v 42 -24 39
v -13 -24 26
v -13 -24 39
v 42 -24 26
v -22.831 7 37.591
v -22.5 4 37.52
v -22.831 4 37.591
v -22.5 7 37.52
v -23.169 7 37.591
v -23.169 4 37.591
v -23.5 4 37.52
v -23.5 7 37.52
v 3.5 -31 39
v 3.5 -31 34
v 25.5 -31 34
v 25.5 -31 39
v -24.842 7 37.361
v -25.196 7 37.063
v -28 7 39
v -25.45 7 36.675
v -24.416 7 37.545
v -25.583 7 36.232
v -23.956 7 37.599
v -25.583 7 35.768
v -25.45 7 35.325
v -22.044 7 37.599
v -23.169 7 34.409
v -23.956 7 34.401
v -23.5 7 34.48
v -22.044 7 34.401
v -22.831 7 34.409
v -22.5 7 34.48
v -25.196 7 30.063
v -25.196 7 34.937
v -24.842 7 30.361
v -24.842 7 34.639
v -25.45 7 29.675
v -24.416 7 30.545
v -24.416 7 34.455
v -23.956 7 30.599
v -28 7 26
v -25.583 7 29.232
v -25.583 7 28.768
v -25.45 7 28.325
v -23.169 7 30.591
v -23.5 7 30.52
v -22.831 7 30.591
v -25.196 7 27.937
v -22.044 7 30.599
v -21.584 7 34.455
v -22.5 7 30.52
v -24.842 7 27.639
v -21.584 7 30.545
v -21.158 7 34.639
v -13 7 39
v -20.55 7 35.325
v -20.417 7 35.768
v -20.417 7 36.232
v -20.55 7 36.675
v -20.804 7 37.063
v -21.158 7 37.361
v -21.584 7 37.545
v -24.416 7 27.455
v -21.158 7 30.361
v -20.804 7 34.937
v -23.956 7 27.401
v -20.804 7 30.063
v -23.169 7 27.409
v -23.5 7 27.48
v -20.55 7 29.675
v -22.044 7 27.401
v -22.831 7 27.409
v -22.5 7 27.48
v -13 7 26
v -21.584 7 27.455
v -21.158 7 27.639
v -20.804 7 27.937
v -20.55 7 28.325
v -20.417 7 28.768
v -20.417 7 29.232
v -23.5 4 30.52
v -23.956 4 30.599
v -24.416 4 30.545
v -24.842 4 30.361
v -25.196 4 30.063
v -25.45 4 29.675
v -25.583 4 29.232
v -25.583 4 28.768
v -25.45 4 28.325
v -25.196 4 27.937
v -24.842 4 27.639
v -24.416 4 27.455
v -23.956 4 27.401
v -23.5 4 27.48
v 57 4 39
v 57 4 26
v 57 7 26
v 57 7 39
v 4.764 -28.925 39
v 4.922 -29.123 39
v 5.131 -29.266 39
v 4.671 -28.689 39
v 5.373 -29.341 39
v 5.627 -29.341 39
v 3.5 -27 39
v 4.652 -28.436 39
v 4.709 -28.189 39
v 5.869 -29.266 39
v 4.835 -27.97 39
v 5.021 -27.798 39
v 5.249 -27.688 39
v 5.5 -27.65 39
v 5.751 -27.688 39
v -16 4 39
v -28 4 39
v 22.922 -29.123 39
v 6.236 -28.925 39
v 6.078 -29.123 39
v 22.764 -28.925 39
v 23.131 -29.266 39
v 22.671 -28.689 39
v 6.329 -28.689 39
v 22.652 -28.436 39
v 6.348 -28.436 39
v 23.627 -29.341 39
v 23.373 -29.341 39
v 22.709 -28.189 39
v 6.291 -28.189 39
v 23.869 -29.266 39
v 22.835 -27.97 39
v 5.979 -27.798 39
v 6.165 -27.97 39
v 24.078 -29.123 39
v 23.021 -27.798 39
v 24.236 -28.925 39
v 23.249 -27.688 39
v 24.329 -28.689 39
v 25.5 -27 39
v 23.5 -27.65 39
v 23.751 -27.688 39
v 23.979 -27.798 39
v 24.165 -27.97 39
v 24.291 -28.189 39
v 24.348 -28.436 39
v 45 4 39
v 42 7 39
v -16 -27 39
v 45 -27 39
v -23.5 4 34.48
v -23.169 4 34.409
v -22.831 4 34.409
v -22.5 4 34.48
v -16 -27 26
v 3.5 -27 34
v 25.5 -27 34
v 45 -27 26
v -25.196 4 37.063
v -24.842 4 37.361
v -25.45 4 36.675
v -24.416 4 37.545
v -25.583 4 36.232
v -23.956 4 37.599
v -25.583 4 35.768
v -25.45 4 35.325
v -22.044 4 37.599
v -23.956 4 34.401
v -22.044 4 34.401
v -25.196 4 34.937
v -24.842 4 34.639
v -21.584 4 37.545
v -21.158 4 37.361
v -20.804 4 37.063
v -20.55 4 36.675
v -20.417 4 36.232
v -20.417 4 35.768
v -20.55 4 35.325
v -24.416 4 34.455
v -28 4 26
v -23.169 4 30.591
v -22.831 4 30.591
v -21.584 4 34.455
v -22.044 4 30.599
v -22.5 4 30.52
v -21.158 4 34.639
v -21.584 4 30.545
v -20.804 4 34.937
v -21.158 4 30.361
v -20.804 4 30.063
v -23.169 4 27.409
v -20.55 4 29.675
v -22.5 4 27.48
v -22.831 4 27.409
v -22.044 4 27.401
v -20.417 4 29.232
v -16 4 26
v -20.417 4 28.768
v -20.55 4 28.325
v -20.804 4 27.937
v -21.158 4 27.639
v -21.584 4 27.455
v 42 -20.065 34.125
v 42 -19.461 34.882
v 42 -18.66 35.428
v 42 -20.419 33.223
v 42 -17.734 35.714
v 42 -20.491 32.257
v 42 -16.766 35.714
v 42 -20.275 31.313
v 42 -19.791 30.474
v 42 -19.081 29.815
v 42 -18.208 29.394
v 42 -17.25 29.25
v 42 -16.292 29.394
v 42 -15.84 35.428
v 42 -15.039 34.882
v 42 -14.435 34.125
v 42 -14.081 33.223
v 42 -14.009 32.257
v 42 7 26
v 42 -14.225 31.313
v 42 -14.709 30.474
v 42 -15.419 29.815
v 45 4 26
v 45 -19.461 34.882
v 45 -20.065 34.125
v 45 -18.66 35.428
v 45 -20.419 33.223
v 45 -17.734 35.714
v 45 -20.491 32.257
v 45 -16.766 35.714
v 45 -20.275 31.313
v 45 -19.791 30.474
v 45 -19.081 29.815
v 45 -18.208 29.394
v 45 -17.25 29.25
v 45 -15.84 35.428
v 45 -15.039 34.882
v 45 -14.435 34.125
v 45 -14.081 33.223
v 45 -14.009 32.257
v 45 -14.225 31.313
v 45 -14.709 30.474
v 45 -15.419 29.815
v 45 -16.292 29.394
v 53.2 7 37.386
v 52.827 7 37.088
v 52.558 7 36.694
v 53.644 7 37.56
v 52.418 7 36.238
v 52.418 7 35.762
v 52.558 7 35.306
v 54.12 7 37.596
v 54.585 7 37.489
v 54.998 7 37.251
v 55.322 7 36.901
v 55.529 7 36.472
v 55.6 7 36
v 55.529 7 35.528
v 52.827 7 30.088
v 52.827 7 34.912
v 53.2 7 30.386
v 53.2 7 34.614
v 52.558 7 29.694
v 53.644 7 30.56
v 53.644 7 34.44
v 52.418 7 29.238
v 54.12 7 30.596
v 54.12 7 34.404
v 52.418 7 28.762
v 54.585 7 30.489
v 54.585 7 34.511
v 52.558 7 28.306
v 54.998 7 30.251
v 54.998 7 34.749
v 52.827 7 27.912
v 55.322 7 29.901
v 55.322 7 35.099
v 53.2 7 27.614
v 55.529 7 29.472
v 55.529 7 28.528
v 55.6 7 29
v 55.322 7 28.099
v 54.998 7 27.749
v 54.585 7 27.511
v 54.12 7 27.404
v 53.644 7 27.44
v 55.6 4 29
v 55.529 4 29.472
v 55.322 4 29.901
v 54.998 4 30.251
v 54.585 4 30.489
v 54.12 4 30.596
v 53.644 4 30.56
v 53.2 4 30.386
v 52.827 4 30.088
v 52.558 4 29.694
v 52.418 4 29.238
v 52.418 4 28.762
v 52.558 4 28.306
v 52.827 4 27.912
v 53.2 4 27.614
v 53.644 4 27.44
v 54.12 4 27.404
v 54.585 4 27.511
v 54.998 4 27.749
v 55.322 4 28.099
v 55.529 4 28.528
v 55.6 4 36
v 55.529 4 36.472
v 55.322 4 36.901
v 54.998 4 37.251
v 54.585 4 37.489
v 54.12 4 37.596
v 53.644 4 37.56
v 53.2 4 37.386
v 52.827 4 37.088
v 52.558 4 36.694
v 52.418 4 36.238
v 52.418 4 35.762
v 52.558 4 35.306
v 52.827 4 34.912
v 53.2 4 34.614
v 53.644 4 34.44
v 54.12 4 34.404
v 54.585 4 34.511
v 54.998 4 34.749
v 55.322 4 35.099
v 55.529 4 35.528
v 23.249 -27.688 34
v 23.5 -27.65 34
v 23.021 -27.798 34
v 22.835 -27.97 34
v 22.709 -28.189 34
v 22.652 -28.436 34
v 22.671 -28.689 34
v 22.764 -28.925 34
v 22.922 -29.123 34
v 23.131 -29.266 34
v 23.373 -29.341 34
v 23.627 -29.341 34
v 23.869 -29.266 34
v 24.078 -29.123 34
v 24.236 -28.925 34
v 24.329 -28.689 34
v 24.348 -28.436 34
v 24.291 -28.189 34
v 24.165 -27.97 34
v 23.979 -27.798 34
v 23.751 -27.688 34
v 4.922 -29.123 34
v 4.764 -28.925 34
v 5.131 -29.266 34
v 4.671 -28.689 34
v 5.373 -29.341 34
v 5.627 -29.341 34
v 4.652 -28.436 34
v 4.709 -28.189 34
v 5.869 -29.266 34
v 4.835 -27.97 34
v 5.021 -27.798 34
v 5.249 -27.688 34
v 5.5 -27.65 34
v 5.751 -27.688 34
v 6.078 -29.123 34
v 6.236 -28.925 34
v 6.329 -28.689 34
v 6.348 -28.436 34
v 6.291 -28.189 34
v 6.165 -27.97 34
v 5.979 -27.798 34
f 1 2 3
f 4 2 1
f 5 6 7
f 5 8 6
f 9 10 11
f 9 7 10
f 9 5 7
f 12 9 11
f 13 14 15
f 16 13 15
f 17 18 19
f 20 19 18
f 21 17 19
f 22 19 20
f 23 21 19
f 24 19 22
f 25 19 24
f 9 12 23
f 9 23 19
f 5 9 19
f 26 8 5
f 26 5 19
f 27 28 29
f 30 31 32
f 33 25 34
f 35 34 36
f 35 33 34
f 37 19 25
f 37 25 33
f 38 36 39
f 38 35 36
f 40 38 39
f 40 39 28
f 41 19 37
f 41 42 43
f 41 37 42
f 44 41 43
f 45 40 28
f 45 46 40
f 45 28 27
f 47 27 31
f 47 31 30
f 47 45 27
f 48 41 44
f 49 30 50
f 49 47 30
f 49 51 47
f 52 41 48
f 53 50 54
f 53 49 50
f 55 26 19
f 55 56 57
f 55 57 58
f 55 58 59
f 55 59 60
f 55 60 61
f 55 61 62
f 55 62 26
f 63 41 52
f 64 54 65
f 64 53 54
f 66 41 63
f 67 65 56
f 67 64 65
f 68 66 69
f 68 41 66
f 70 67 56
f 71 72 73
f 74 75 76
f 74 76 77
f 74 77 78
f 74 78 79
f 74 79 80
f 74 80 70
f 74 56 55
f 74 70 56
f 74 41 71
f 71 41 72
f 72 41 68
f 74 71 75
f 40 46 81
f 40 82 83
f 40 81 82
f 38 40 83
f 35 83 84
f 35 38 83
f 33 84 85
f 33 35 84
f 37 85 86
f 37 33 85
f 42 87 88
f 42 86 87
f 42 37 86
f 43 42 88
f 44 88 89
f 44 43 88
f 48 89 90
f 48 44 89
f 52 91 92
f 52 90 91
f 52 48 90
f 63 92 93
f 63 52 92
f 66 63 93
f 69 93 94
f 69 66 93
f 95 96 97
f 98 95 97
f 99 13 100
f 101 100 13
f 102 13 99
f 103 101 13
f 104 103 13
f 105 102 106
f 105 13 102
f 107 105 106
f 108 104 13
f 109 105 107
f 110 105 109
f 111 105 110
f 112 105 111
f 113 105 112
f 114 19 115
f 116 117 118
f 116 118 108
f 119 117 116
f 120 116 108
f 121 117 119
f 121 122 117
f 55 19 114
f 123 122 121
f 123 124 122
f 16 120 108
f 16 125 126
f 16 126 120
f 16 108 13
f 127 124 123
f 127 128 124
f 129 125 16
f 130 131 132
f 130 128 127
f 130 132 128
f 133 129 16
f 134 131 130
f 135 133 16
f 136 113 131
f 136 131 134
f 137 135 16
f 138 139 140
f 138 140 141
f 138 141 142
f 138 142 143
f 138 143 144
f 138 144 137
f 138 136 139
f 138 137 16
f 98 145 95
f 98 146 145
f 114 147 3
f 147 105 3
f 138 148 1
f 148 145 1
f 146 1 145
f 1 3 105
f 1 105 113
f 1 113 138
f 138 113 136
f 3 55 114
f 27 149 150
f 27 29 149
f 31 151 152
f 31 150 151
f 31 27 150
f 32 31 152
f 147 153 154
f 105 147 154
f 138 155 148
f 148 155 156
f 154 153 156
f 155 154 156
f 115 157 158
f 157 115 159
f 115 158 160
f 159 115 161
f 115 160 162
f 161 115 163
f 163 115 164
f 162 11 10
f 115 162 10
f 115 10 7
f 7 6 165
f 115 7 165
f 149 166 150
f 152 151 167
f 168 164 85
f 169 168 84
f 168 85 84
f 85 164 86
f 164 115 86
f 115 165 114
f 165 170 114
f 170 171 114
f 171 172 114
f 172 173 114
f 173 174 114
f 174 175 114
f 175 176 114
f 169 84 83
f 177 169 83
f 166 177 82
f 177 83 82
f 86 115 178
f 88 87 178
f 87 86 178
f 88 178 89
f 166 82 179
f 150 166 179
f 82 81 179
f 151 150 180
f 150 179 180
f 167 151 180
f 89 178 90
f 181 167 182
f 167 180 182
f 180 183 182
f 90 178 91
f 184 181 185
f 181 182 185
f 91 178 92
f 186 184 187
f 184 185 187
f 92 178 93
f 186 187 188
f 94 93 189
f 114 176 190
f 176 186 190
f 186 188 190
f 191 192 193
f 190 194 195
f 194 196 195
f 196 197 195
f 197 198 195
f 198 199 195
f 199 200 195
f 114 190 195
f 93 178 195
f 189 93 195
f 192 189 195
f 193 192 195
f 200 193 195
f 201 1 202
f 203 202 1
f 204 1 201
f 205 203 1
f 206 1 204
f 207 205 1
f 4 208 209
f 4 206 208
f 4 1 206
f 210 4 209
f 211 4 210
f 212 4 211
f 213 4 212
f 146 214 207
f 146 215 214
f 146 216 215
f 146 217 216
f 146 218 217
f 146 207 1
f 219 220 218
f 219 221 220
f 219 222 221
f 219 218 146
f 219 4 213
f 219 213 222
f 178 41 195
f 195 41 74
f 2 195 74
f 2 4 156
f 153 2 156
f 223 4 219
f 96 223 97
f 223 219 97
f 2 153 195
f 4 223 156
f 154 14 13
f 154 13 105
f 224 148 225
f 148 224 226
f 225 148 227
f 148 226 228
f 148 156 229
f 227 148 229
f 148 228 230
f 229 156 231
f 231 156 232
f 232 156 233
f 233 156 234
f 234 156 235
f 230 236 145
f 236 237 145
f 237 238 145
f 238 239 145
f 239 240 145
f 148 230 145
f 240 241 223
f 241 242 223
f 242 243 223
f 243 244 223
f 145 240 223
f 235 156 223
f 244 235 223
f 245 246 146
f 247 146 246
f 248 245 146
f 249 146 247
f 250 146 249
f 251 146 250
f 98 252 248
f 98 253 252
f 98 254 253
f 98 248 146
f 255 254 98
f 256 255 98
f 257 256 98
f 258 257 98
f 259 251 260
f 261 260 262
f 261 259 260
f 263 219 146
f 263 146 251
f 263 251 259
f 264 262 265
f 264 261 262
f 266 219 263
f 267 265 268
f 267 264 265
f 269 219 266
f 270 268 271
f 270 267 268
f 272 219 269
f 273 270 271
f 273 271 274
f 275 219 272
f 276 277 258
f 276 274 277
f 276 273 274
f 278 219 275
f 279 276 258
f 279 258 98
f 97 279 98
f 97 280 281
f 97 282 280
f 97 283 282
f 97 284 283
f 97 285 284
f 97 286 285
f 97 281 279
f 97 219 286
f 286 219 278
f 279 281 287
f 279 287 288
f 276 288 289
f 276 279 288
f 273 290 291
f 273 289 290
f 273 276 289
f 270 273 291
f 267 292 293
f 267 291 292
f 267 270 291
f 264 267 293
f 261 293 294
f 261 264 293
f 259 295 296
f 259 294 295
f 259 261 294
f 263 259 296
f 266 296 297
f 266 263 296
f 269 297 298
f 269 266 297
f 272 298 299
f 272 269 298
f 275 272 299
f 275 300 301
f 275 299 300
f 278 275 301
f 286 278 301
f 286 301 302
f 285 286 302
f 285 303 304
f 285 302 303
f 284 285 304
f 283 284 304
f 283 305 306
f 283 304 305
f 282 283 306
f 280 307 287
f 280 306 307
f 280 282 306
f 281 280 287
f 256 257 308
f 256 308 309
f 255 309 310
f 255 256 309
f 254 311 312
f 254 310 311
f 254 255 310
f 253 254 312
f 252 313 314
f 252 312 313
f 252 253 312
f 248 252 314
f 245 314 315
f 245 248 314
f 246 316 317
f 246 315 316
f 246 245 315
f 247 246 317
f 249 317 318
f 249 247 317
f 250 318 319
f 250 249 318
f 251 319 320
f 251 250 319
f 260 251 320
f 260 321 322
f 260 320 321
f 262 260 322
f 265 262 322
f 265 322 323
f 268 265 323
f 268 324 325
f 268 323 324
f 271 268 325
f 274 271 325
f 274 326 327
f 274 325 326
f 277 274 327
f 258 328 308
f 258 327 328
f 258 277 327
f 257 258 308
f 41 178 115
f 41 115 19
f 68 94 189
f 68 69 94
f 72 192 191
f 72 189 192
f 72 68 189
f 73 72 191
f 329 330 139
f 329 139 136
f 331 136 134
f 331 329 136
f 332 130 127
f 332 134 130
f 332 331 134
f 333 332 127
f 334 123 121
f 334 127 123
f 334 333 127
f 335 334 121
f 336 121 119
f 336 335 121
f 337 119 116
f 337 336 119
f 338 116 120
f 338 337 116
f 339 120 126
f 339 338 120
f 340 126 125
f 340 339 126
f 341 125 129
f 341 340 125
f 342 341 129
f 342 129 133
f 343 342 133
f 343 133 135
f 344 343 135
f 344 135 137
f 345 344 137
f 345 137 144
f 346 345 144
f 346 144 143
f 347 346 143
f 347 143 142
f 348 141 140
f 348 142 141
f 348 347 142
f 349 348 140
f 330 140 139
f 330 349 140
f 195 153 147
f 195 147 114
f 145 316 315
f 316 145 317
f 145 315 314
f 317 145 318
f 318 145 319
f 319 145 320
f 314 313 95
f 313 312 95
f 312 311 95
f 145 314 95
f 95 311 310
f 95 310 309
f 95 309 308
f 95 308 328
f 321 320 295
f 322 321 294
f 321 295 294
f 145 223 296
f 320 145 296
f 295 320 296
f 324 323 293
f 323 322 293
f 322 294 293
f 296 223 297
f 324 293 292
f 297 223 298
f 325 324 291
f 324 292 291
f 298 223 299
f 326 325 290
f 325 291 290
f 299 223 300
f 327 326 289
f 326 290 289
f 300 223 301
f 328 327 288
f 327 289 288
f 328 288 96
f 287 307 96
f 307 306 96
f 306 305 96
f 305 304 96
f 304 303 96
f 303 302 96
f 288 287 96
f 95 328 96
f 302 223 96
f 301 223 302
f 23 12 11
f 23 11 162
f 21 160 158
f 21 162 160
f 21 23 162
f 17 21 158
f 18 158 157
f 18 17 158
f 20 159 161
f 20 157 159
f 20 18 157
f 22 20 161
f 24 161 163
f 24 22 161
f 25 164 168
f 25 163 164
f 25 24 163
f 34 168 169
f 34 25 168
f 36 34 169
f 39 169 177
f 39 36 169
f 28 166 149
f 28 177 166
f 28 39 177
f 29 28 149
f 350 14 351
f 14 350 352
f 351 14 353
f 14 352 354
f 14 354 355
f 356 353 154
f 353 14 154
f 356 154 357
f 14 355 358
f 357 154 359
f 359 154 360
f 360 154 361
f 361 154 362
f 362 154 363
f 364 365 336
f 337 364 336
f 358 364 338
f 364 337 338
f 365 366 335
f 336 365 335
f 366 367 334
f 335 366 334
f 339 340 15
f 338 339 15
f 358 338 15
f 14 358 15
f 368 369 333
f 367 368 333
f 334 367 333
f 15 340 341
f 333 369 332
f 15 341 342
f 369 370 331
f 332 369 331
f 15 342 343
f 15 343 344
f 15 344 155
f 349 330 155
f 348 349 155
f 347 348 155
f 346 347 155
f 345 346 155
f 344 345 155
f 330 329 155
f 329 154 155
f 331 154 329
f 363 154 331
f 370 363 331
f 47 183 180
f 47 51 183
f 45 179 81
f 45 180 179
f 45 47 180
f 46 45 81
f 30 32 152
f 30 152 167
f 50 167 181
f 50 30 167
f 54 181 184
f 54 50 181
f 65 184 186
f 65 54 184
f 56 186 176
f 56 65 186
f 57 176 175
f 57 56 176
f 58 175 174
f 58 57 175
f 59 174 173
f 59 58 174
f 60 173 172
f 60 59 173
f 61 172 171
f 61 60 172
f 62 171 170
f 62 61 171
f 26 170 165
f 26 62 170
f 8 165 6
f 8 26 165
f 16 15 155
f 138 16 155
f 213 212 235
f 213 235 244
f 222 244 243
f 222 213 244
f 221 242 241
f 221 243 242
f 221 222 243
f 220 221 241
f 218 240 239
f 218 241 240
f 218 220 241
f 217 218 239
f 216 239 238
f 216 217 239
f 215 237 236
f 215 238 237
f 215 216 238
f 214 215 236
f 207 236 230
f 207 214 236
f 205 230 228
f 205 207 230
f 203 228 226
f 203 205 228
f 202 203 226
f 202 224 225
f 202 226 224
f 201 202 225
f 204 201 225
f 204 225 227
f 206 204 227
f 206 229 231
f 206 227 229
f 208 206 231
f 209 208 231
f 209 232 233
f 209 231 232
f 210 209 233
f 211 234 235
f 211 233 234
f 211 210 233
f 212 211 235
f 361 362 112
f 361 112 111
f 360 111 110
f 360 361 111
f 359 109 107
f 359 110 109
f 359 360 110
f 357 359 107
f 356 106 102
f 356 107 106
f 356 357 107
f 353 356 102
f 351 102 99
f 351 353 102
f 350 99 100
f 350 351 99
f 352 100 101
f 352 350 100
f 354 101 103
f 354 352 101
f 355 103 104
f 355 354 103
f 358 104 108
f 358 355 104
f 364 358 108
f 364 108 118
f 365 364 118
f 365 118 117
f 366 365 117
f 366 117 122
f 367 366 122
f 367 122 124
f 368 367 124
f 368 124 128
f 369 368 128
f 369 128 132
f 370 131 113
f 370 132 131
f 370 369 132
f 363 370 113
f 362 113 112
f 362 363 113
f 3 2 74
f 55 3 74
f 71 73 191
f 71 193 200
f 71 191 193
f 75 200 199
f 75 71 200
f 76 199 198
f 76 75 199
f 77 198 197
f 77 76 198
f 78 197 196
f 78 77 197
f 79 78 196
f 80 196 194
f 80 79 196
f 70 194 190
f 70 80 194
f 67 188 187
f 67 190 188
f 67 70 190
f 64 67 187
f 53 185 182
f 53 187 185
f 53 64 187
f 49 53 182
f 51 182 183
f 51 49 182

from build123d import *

# Parameters (mm, degrees)
CYLINDER051_R             = 1.6
CYLINDER051_DEPTH         = 28
CYLINDER051_ROLL_ANGLE    = 90
CYLINDER050_R             = 1.6
CYLINDER050_DEPTH         = 28
CYLINDER050_ROLL_ANGLE    = 90
CYLINDER049_R             = 1.6
CYLINDER049_DEPTH         = 28
CYLINDER049_ROLL_ANGLE    = 90
CYLINDER048_R             = 1.6
CYLINDER048_DEPTH         = 28
CYLINDER048_ROLL_ANGLE    = 90
CYLINDER044_R             = 1.6
CYLINDER044_DEPTH         = 28
CYLINDER044_ROLL_ANGLE    = 90
CYLINDER043_R             = 1.6
CYLINDER043_DEPTH         = 28
CYLINDER043_ROLL_ANGLE    = 90
CYLINDER042_R             = 1.6
CYLINDER042_DEPTH         = 28
CYLINDER042_ROLL_ANGLE    = 90
CYLINDER041_R             = 1.6
CYLINDER041_DEPTH         = 28
CYLINDER041_ROLL_ANGLE    = 90
CYLINDER047_R             = 0.85
CYLINDER047_DEPTH         = 10
CYLINDER046_R             = 0.85
CYLINDER046_DEPTH         = 10
FUSION078_PLACEMENT_ANGLE = 90
BOX025_W                  = 22
BOX025_H                  = 4
BOX025_DEPTH              = 5
CYLINDER045_R             = 3.25
CYLINDER045_DEPTH         = 10
CYLINDER045_PITCH_ANGLE   = 90
BOX024_W                  = 55
BOX024_H                  = 31
BOX024_DEPTH              = 13
BOX021_W                  = 61
BOX021_H                  = 34
BOX021_DEPTH              = 13
BOX023_W                  = 12
BOX023_H                  = 3
BOX023_DEPTH              = 13
BOX022_W                  = 12
BOX022_H                  = 3
BOX022_DEPTH              = 13


with BuildPart() as cylinder067:
    # Cylinder051 → Cylinder051 (new body)
    with BuildSketch(Plane.XY):
        Circle(CYLINDER051_R)
    extrude(amount=CYLINDER051_DEPTH)


with BuildPart() as cylinder067_1:
    # Cylinder051 roll: moved
    add(cylinder067.part.rotate(Axis((0, 0, 0), (1, 0, 0)), CYLINDER051_ROLL_ANGLE))


with BuildPart() as cylinder067_2:
    # Cylinder051 placement: moved
    add(cylinder067_1.part.moved(Location((-23, 20, 36))))


with BuildPart() as fusion085:
    # Cylinder050 → Cylinder050 (new body)
    with BuildSketch(Plane.XY):
        Circle(CYLINDER050_R)
    extrude(amount=CYLINDER050_DEPTH)


with BuildPart() as fusion085_1:
    # Cylinder050 roll: moved
    add(fusion085.part.rotate(Axis((0, 0, 0), (1, 0, 0)), CYLINDER050_ROLL_ANGLE))


with BuildPart() as fusion085_2:
    # Cylinder050 placement: moved
    add(fusion085_1.part.moved(Location((-23, 20, 29))))

    # Fusion085: union Cylinder067
    add(cylinder067_2.part)


with BuildPart() as fusion085_3:
    # Fusion085 placement: moved
    add(fusion085_2.part.moved(Location((-1, 0, 0))))


with BuildPart() as cylinder063:
    # Cylinder049 → Cylinder049 (new body)
    with BuildSketch(Plane.XY):
        Circle(CYLINDER049_R)
    extrude(amount=CYLINDER049_DEPTH)


with BuildPart() as cylinder063_1:
    # Cylinder049 roll: moved
    add(cylinder063.part.rotate(Axis((0, 0, 0), (1, 0, 0)), CYLINDER049_ROLL_ANGLE))


with BuildPart() as cylinder063_2:
    # Cylinder049 placement: moved
    add(cylinder063_1.part.moved(Location((-23, 20, 36))))


with BuildPart() as fusion084:
    # Cylinder048 → Cylinder048 (new body)
    with BuildSketch(Plane.XY):
        Circle(CYLINDER048_R)
    extrude(amount=CYLINDER048_DEPTH)


with BuildPart() as fusion084_1:
    # Cylinder048 roll: moved
    add(fusion084.part.rotate(Axis((0, 0, 0), (1, 0, 0)), CYLINDER048_ROLL_ANGLE))


with BuildPart() as fusion084_2:
    # Cylinder048 placement: moved
    add(fusion084_1.part.moved(Location((-23, 20, 29))))

    # Fusion084: union Cylinder063
    add(cylinder063_2.part)


with BuildPart() as fusion084_3:
    # Fusion084 placement: moved
    add(fusion084_2.part.moved(Location((1, 0, 0))))


with BuildPart() as cylinder054:
    # Cylinder044 → Cylinder044 (new body)
    with BuildSketch(Plane.XY):
        Circle(CYLINDER044_R)
    extrude(amount=CYLINDER044_DEPTH)


with BuildPart() as cylinder054_1:
    # Cylinder044 roll: moved
    add(cylinder054.part.rotate(Axis((0, 0, 0), (1, 0, 0)), CYLINDER044_ROLL_ANGLE))


with BuildPart() as cylinder054_2:
    # Cylinder044 placement: moved
    add(cylinder054_1.part.moved(Location((-23, 20, 36))))


with BuildPart() as fusion080:
    # Cylinder043 → Cylinder043 (new body)
    with BuildSketch(Plane.XY):
        Circle(CYLINDER043_R)
    extrude(amount=CYLINDER043_DEPTH)


with BuildPart() as fusion080_1:
    # Cylinder043 roll: moved
    add(fusion080.part.rotate(Axis((0, 0, 0), (1, 0, 0)), CYLINDER043_ROLL_ANGLE))


with BuildPart() as fusion080_2:
    # Cylinder043 placement: moved
    add(fusion080_1.part.moved(Location((-23, 20, 29))))

    # Fusion080: union Cylinder054
    add(cylinder054_2.part)


with BuildPart() as cylinder052:
    # Cylinder042 → Cylinder042 (new body)
    with BuildSketch(Plane.XY):
        Circle(CYLINDER042_R)
    extrude(amount=CYLINDER042_DEPTH)


with BuildPart() as cylinder052_1:
    # Cylinder042 roll: moved
    add(cylinder052.part.rotate(Axis((0, 0, 0), (1, 0, 0)), CYLINDER042_ROLL_ANGLE))


with BuildPart() as cylinder052_2:
    # Cylinder042 placement: moved
    add(cylinder052_1.part.moved(Location((54, 20, 36))))


with BuildPart() as fusion081:
    # Cylinder041 → Cylinder041 (new body)
    with BuildSketch(Plane.XY):
        Circle(CYLINDER041_R)
    extrude(amount=CYLINDER041_DEPTH)


with BuildPart() as fusion081_1:
    # Cylinder041 roll: moved
    add(fusion081.part.rotate(Axis((0, 0, 0), (1, 0, 0)), CYLINDER041_ROLL_ANGLE))


with BuildPart() as fusion081_2:
    # Cylinder041 placement: moved
    add(fusion081_1.part.moved(Location((54, 20, 29))))

    # Fusion081: union Cylinder052
    add(cylinder052_2.part)


with BuildPart() as cylinder059:
    # Cylinder047 → Cylinder047 (new body)
    with BuildSketch(Plane(origin=(10.5, -9, 0), x_dir=(1, 0, 0), z_dir=(0, 0, 1))):
        Circle(CYLINDER047_R)
    extrude(amount=CYLINDER047_DEPTH)


with BuildPart() as fusion078:
    # Cylinder046 → Cylinder046 (new body)
    with BuildSketch(Plane(origin=(10.5, 9, 0), x_dir=(1, 0, 0), z_dir=(0, 0, 1))):
        Circle(CYLINDER046_R)
    extrude(amount=CYLINDER046_DEPTH)

    # Fusion078: union Cylinder059
    add(cylinder059.part)


with BuildPart() as fusion078_1:
    # Fusion078 placement: moved
    add(fusion078.part.moved(Location((14.5, -39, 31))).rotate(Axis((14.5, -39, 31), (0, 0, 1)), FUSION078_PLACEMENT_ANGLE))


with BuildPart() as cut039:
    # Box025 → Box025 (new body)
    with BuildSketch(Plane(origin=(3.5, -31, 34), x_dir=(1, 0, 0), z_dir=(0, 0, 1))):
        with Locations((11, 2)):
            Rectangle(BOX025_W, BOX025_H)
    extrude(amount=BOX025_DEPTH)

    # Cut039: cut Fusion078
    add(fusion078_1.part, mode=Mode.SUBTRACT)


with BuildPart() as cylinder055:
    # Cylinder045 → Cylinder045 (new body)
    with BuildSketch(Plane.XY):
        Circle(CYLINDER045_R)
    extrude(amount=CYLINDER045_DEPTH)


with BuildPart() as cylinder055_1:
    # Cylinder045 pitch: moved
    add(cylinder055.part.rotate(Axis((0, 0, 0), (0, 1, 0)), CYLINDER045_PITCH_ANGLE))


with BuildPart() as cylinder055_2:
    # Cylinder045 placement: moved
    add(cylinder055_1.part.moved(Location((36, -17.25, 32.5))))


with BuildPart() as cube023:
    # Box024 → Box024 (new body)
    with BuildSketch(Plane(origin=(-13, -24, 26), x_dir=(1, 0, 0), z_dir=(0, 0, 1))):
        with Locations((27.5, 15.5)):
            Rectangle(BOX024_W, BOX024_H)
    extrude(amount=BOX024_DEPTH)


with BuildPart() as fusion079:
    # Box021 → Box021 (new body)
    with BuildSketch(Plane(origin=(-16, -27, 26), x_dir=(1, 0, 0), z_dir=(0, 0, 1))):
        with Locations((30.5, 17)):
            Rectangle(BOX021_W, BOX021_H)
    extrude(amount=BOX021_DEPTH)

    # Cut037: cut Cube023
    add(cube023.part, mode=Mode.SUBTRACT)

    # Cut038: cut Cylinder055
    add(cylinder055_2.part, mode=Mode.SUBTRACT)

    # Fusion079: union Cut039
    add(cut039.part)


with BuildPart() as fusion082:
    # Box023 → Box023 (new body)
    with BuildSketch(Plane(origin=(-28, 4, 26), x_dir=(1, 0, 0), z_dir=(0, 0, 1))):
        with Locations((6, 1.5)):
            Rectangle(BOX023_W, BOX023_H)
    extrude(amount=BOX023_DEPTH)

    # Fusion082: union Fusion079
    add(fusion079.part)


with BuildPart() as switch_bracket001:
    # Box022 → Box022 (new body)
    with BuildSketch(Plane(origin=(45, 4, 26), x_dir=(1, 0, 0), z_dir=(0, 0, 1))):
        with Locations((6, 1.5)):
            Rectangle(BOX022_W, BOX022_H)
    extrude(amount=BOX022_DEPTH)

    # Fusion083: union Fusion082
    add(fusion082.part)

    # Cut040: cut Fusion081
    add(fusion081_2.part, mode=Mode.SUBTRACT)

    # Cut041: cut Fusion080
    add(fusion080_2.part, mode=Mode.SUBTRACT)

    # Cut042: cut Fusion084
    add(fusion084_3.part, mode=Mode.SUBTRACT)

    # Cut043: cut Fusion085
    add(fusion085_3.part, mode=Mode.SUBTRACT)


solid = switch_bracket001.part
